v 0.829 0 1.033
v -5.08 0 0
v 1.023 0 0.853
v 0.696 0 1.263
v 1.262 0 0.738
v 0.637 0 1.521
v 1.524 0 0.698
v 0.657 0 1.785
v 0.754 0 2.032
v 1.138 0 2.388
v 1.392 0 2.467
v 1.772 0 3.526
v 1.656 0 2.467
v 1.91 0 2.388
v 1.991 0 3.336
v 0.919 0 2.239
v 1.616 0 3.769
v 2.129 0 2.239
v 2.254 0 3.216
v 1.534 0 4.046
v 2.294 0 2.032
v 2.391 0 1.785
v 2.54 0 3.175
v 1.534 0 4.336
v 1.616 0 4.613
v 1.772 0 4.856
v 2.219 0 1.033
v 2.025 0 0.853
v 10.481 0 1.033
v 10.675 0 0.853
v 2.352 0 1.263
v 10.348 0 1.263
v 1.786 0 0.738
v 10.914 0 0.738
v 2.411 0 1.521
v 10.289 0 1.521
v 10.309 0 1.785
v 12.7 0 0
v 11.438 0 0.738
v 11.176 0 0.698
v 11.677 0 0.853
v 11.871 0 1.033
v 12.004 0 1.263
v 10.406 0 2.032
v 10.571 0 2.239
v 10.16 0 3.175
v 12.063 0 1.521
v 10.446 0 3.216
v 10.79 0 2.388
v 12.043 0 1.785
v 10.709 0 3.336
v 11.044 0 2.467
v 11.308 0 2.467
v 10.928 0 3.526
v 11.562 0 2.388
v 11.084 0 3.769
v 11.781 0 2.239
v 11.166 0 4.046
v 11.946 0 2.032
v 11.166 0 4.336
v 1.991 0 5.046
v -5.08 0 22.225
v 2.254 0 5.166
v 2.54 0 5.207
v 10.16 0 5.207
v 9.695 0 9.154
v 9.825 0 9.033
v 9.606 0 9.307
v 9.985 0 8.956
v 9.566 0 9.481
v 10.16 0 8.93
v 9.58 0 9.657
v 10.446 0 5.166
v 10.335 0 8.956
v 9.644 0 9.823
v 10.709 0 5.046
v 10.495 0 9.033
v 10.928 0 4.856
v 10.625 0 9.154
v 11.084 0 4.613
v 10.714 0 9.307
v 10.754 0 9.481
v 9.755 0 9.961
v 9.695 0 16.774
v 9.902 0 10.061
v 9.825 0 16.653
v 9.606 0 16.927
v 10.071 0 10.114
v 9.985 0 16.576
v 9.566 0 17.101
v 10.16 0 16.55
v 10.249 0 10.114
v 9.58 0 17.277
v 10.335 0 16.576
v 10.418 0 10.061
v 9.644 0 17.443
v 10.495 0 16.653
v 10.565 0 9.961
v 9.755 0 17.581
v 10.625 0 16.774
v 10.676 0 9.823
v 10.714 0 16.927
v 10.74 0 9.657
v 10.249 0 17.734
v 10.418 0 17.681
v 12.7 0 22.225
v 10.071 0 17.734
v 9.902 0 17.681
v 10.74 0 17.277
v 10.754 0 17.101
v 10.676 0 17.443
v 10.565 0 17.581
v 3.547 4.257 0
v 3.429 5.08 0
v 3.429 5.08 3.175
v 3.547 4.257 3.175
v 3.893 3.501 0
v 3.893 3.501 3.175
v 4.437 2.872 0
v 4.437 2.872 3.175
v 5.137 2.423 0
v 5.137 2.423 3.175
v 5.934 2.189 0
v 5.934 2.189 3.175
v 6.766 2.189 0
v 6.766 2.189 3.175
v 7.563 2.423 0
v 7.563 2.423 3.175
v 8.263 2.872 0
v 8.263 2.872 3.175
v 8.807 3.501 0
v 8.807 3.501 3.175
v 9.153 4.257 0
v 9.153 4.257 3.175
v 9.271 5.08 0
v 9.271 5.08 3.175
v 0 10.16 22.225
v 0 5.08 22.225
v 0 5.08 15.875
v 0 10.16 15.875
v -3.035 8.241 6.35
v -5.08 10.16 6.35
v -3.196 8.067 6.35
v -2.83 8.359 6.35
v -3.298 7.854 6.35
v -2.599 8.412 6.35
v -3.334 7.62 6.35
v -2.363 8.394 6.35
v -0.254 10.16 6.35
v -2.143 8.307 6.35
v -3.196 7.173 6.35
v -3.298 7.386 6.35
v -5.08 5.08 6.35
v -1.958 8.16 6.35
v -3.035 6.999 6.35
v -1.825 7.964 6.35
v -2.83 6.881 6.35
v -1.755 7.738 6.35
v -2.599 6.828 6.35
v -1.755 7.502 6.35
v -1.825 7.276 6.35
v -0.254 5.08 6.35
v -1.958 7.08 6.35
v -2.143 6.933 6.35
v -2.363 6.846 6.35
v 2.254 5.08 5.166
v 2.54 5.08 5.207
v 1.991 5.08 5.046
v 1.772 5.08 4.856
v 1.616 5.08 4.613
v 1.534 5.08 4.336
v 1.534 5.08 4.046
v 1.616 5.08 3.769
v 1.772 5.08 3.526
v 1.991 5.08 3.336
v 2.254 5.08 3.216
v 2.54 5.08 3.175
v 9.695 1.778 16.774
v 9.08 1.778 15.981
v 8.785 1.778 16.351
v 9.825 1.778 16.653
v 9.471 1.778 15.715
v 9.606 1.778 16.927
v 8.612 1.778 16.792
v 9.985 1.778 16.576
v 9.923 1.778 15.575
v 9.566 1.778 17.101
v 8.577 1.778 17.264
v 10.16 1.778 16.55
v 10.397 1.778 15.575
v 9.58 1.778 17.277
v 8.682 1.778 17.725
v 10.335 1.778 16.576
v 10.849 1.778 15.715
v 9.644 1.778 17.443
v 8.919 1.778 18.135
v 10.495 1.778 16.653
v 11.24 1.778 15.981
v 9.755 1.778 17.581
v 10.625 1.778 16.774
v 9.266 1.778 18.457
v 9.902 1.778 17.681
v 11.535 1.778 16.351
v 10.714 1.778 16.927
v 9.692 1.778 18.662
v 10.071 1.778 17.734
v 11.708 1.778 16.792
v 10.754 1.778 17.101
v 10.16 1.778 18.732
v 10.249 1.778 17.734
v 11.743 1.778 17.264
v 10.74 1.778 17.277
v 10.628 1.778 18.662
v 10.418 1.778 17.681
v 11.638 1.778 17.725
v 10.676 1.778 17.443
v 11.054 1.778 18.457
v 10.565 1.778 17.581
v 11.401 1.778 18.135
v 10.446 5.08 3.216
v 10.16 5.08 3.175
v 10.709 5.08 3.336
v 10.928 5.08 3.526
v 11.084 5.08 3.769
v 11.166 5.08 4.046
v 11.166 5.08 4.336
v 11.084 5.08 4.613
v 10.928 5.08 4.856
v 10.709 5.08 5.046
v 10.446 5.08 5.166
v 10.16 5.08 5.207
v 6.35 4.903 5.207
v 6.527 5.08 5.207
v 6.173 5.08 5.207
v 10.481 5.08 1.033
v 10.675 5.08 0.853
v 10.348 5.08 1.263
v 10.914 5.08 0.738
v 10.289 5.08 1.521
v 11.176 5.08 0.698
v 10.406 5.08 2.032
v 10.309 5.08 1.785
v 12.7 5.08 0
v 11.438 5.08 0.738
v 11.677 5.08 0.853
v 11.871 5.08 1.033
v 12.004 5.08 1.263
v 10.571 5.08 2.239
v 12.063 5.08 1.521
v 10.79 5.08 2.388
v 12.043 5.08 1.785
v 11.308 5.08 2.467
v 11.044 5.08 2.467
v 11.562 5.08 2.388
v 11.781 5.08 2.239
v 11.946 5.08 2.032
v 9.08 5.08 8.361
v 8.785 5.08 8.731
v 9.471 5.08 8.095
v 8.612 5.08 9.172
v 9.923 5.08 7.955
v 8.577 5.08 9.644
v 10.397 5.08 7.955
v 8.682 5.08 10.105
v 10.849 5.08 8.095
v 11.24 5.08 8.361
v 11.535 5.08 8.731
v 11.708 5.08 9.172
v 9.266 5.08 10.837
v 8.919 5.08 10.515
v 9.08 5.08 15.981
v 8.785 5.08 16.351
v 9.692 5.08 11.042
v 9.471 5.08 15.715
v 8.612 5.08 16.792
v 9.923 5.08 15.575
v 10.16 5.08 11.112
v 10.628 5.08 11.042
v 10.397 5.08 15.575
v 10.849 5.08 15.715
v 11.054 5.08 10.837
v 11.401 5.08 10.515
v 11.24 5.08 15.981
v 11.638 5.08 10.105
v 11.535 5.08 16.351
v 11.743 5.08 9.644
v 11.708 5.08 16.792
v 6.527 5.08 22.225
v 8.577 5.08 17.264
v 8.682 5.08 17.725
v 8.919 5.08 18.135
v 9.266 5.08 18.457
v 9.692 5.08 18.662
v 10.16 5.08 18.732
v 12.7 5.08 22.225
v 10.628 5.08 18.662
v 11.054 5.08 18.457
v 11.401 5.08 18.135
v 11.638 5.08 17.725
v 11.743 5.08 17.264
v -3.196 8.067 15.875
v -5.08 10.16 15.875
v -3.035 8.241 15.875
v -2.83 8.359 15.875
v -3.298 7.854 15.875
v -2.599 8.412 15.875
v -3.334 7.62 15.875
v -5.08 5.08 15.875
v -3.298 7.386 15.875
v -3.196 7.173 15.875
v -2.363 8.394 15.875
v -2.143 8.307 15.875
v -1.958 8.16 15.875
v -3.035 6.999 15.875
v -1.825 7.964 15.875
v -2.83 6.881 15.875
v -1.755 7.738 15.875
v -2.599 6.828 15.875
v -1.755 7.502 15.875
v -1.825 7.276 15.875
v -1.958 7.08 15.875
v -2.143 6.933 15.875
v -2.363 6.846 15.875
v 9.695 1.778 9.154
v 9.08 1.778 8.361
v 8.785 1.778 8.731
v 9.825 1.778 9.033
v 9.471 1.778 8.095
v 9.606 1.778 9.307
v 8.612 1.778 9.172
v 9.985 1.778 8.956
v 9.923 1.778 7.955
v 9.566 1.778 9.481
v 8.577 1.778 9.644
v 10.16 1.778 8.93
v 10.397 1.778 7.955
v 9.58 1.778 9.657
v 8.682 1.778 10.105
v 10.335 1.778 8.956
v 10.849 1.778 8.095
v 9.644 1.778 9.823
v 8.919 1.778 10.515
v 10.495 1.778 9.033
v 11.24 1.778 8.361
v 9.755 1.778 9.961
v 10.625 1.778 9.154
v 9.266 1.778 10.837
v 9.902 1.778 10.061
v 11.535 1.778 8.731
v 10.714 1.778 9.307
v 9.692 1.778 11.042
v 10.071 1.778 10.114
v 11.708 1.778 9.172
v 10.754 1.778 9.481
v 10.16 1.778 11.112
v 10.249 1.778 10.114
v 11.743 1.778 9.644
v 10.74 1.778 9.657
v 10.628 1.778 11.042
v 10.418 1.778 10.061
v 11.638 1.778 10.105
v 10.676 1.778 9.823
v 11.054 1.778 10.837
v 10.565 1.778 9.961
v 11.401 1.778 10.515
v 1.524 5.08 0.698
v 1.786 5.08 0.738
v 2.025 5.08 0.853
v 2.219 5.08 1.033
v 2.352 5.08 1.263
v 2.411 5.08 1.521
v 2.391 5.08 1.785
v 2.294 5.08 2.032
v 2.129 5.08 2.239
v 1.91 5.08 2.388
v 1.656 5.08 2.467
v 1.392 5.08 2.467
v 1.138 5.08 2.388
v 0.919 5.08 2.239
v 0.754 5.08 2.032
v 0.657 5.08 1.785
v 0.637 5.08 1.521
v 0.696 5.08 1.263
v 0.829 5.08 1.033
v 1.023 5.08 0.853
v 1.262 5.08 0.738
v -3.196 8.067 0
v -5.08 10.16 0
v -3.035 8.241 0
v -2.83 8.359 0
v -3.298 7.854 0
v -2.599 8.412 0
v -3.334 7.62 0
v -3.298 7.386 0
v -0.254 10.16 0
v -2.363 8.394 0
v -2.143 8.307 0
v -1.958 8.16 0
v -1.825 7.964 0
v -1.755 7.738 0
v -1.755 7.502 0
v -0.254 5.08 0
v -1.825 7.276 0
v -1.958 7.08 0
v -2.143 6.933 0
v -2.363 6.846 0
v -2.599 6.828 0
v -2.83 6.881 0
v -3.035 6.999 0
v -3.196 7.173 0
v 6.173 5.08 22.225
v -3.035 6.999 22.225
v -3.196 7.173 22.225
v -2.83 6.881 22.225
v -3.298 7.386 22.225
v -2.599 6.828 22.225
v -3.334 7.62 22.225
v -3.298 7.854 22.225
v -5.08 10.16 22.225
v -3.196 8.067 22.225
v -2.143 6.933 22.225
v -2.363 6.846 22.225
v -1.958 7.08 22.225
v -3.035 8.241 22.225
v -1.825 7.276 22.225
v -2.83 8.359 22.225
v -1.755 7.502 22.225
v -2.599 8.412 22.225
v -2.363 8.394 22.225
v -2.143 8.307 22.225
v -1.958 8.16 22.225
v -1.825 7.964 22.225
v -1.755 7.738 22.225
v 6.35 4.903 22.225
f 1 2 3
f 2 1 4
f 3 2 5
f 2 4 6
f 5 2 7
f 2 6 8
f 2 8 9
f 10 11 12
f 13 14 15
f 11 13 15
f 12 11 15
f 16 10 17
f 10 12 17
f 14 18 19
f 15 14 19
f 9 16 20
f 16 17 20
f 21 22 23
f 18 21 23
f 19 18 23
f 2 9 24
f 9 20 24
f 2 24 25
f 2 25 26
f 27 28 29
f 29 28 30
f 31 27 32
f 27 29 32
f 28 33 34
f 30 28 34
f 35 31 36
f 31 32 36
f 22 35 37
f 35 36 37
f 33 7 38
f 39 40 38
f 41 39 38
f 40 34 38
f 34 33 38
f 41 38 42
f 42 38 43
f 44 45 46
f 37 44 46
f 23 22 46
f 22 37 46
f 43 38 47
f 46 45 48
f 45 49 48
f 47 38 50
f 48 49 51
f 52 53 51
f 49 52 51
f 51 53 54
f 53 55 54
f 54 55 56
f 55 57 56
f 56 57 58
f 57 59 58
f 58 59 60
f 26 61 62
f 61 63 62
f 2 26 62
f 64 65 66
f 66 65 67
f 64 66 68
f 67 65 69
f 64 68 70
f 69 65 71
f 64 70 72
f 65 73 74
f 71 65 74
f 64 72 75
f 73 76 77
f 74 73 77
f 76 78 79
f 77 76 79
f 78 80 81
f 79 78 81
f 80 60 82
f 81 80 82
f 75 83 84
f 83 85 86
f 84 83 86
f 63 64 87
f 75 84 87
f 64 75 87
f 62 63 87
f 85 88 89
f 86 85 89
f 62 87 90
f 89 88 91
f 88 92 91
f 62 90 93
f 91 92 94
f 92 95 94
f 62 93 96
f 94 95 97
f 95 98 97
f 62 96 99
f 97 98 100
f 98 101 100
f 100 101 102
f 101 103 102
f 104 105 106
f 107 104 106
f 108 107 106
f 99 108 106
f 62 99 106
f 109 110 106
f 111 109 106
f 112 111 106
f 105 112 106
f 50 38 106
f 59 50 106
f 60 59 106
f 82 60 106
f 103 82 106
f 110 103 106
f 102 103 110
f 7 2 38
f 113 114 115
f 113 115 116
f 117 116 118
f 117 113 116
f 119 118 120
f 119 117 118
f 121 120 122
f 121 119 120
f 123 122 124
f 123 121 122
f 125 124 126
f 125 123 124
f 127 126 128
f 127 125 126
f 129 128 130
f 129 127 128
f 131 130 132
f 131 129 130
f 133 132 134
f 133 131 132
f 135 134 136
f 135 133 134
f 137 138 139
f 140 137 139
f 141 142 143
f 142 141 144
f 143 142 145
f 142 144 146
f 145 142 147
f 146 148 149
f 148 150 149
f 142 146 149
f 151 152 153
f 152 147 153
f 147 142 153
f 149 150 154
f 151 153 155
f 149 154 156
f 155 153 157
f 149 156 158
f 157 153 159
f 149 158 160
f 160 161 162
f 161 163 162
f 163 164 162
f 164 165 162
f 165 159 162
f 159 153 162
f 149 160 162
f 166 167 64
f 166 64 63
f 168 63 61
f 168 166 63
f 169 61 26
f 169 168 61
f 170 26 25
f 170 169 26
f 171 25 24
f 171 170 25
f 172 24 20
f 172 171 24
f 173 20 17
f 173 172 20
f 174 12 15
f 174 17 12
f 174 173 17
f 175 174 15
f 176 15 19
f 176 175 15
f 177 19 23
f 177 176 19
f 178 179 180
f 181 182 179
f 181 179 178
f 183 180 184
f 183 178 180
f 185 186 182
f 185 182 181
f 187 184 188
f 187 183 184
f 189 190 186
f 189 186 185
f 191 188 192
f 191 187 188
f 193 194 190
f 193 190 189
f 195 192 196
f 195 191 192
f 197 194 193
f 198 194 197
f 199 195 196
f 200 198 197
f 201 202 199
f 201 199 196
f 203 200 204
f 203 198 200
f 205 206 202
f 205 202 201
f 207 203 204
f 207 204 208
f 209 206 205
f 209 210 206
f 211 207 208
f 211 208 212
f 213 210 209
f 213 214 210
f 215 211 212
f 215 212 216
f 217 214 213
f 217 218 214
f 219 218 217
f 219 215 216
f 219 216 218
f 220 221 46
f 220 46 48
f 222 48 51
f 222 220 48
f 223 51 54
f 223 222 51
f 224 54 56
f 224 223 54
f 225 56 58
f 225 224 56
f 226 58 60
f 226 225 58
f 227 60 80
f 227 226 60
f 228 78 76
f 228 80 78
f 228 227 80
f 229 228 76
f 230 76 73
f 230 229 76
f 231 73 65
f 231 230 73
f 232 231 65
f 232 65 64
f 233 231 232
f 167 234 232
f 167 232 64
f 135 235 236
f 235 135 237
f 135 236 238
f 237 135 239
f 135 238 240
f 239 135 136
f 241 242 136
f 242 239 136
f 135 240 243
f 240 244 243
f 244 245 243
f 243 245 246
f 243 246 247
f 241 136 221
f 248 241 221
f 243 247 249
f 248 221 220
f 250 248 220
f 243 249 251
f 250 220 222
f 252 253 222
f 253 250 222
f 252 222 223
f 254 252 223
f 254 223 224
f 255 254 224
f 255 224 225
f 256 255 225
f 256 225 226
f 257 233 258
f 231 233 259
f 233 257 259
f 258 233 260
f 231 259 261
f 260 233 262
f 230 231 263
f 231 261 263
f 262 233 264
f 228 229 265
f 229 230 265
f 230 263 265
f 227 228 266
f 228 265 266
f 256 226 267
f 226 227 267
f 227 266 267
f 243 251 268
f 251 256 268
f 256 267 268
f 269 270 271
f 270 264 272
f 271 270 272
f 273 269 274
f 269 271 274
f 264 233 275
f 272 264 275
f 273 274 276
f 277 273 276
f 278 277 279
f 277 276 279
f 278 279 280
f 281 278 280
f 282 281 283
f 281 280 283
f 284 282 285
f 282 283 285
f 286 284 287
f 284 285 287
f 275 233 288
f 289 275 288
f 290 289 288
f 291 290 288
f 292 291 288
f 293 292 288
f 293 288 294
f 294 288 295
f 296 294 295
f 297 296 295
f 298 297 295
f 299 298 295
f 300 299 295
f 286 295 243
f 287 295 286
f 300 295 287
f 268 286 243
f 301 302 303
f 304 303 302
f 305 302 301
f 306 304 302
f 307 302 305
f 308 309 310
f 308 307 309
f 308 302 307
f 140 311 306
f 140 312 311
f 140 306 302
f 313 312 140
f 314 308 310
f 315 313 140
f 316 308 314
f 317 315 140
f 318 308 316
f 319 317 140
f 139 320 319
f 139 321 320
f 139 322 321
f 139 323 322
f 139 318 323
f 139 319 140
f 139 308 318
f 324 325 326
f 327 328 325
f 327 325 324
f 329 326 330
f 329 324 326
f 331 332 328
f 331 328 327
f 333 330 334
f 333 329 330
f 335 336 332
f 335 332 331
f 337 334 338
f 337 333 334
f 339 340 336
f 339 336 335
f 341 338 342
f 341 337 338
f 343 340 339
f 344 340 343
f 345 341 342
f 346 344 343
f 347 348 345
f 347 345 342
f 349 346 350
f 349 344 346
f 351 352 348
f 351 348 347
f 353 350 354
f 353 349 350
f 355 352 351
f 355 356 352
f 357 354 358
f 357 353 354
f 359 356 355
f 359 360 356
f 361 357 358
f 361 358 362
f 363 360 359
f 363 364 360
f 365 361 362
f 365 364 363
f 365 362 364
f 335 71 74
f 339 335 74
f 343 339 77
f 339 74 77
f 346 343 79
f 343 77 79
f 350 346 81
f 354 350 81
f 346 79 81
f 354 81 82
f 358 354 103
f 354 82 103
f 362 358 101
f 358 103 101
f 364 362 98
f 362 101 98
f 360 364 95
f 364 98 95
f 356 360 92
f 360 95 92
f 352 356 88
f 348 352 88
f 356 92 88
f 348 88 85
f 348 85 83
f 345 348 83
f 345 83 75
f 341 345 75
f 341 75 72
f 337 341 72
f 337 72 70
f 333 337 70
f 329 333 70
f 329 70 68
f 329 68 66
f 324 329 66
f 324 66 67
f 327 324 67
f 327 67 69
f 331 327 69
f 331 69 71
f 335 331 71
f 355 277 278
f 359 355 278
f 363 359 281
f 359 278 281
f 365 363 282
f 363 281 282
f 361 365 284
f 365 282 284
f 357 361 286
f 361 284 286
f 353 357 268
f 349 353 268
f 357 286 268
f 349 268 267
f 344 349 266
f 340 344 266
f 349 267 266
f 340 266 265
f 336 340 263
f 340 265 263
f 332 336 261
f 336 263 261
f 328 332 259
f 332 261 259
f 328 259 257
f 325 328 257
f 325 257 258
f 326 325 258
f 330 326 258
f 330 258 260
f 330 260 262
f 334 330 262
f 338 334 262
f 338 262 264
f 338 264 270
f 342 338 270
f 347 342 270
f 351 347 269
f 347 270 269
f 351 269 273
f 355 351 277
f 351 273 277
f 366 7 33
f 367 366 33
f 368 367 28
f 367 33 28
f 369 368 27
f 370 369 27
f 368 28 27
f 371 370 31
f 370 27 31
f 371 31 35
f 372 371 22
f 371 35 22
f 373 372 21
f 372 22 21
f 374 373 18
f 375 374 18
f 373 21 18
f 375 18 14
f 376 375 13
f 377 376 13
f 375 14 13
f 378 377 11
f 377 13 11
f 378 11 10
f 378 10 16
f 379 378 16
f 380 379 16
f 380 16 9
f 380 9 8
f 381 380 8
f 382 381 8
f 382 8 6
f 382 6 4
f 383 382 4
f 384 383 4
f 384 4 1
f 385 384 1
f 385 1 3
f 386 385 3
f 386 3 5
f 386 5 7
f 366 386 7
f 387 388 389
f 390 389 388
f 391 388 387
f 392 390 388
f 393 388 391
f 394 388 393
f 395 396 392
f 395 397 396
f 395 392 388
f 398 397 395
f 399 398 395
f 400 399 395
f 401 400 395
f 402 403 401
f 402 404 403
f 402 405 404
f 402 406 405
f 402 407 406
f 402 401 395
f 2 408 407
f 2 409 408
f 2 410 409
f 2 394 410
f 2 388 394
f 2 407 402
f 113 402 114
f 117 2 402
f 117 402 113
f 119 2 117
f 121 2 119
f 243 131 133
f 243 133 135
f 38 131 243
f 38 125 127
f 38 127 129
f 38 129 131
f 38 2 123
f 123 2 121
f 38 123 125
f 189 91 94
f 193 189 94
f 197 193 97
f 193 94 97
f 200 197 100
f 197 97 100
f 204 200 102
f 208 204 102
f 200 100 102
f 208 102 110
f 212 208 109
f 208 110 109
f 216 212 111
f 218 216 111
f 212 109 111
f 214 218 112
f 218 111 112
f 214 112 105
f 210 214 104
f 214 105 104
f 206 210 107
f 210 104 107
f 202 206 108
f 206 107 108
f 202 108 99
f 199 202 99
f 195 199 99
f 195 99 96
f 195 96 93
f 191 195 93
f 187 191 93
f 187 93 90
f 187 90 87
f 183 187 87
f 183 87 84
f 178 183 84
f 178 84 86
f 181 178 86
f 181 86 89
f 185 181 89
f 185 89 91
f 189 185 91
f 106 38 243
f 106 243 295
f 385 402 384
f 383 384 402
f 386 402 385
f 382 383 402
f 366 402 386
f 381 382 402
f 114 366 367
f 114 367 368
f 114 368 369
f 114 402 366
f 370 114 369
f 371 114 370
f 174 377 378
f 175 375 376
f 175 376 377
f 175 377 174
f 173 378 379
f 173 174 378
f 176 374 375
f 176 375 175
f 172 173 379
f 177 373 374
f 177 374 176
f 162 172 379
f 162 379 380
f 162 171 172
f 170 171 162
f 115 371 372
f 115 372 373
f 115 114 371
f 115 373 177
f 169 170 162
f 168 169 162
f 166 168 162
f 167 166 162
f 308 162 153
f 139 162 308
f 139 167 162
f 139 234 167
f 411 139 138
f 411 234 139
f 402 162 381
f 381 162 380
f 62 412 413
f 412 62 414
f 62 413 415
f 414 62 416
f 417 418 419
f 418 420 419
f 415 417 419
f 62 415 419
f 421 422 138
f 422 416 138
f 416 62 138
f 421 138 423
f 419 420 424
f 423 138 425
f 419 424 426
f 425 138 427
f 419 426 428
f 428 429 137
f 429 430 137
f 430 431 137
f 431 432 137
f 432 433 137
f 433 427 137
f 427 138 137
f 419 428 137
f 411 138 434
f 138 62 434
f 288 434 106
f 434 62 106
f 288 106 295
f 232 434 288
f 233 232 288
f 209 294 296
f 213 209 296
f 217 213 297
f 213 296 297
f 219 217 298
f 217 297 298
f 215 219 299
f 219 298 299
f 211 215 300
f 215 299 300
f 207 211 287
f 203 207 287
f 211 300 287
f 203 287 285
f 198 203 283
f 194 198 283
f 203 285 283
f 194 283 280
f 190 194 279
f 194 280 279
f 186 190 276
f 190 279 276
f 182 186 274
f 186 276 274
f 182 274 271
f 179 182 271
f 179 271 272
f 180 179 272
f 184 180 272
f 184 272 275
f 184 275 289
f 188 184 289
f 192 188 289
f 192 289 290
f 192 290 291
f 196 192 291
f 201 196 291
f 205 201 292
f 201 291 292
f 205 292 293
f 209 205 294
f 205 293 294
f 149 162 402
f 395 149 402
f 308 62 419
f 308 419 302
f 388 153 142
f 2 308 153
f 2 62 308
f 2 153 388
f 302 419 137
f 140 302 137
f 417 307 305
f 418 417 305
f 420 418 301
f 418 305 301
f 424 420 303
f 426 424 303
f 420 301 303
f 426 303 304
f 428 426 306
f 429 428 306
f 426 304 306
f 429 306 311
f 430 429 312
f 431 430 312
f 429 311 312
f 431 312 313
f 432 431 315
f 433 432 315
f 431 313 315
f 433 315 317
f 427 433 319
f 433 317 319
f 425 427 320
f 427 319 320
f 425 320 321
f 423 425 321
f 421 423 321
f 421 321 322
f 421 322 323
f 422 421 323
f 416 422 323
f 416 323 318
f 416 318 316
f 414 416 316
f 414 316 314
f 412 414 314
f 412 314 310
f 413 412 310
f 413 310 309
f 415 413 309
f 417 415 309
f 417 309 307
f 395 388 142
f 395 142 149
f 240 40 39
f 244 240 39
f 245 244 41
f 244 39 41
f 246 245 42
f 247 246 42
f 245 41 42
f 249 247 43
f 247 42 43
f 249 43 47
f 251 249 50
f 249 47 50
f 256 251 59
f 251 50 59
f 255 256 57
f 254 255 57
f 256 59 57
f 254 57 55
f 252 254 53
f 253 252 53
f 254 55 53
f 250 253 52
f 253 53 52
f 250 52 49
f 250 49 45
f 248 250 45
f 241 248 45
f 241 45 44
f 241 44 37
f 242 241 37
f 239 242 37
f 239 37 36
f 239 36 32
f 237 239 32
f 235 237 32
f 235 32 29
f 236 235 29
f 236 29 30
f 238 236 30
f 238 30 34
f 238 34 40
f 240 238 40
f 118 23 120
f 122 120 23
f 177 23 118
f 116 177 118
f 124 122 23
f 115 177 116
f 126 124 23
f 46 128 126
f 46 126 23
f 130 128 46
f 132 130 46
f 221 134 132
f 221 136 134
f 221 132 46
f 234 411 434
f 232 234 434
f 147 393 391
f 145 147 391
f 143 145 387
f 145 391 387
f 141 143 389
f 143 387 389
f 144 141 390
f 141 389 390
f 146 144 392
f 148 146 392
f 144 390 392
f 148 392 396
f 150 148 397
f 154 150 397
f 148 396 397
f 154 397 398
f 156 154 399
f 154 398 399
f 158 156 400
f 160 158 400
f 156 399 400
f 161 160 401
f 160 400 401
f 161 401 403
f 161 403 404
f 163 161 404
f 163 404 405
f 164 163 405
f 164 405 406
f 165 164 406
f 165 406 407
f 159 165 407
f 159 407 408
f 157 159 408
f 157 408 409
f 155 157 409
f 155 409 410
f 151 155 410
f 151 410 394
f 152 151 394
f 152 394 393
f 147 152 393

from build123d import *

# Parameters (mm, degrees)
BOSS_EXTRUDE1_DEPTH                       = 3.175
SKETCH3_W                                 = 12.7
SKETCH3_H                                 = 19.05
BOSS_EXTRUDE2_DEPTH                       = 5.08
CUT_EXTRUDE2_DEPTH                        = 27.096877687
CUT_EXTRUDE3_DEPTH                        = 27.096877687
F_2_56_TAPPED_HOLE1_D                     = 1.778
SKETCH9_W                                 = 22.225
SKETCH9_H                                 = 5.08
BOSS_EXTRUDE3_DEPTH                       = 5.08
SKETCH12_R                                = 1.5875
CUT_EXTRUDE4_DEPTH                        = 3.302
SKETCH13_W                                = 4.826
SKETCH13_H                                = 6.35
SKETCH13_W_2                              = 5.08
BOSS_EXTRUDE4_DEPTH                       = 5.08
F_1_16_0_0625_DIAMETER_HOLE1_D            = 1.5875
F_3_64_0_04688_DIAMETER_HOLE1_D           = 1.190752
F_3_64_0_04688_DIAMETER_HOLE1_ON_FACE_2_D = 1.190752


with BuildPart() as part:
    # Sketch1 → Boss-Extrude1 (new body)
    with BuildSketch(Plane.XY):
        with BuildLine():
            Line((9.271, 5.08), (12.7, 5.08))
            Line((12.7, 5.08), (12.7, 0))
            Line((12.7, 0), (0, 0))
            Line((0, 0), (0, 5.08))
            Line((0, 5.08), (3.429, 5.08))
            ThreePointArc((3.429, 5.08), (6.35, 2.159), (9.271, 5.08))
        make_face()
    extrude(amount=BOSS_EXTRUDE1_DEPTH)

    # Sketch3 → Boss-Extrude2 (add)
    with BuildSketch(Plane.XZ):
        with Locations((6.35, 12.7)):
            Rectangle(SKETCH3_W, SKETCH3_H)
    extrude(amount=-BOSS_EXTRUDE2_DEPTH)

    # Sketch7 → Cut-Extrude2 (cut, through all)
    with BuildSketch(Plane(origin=(0, 5.08, 0), x_dir=(1, 0, 0), z_dir=(0, 1, 0))):
        with BuildLine():
            Line((2.54, -3.175), (10.16, -3.175))
            ThreePointArc((10.16, -3.175), (11.176, -4.191), (10.16, -5.207))
            Line((10.16, -5.207), (2.54, -5.207))
            ThreePointArc((2.54, -5.207), (1.524, -4.191), (2.54, -3.175))
        make_face()
    extrude(amount=-CUT_EXTRUDE2_DEPTH, mode=Mode.SUBTRACT)

    # Sketch6 → Cut-Extrude3 (cut, through all)
    with BuildSketch(Plane.XY.offset(22.225)):
        Polygon((6.173223305, 5.08), (6.35, 4.903223305), (6.526776695, 5.08), align=None)
    extrude(amount=-CUT_EXTRUDE3_DEPTH, mode=Mode.SUBTRACT)

    # #2-56 Tapped Hole1 (through all)
    with Locations(Plane(origin=(11.176, 5.08, 1.5875), x_dir=(0, 0, 1), z_dir=(0, 1, 0))):
        with Locations((0, 0), (0, -9.652)):
            Hole(F_2_56_TAPPED_HOLE1_D / 2)

    # Sketch9 → Boss-Extrude3 (add)
    with BuildSketch(Plane.ZY):
        with Locations((11.1125, 2.54)):
            Rectangle(SKETCH9_W, SKETCH9_H)
    extrude(amount=BOSS_EXTRUDE3_DEPTH)

    # Sketch12 → Cut-Extrude4 (cut)
    with BuildSketch(Plane(origin=(0, 5.08, 0), x_dir=(1, 0, 0), z_dir=(0, 1, 0))):
        with Locations(Location((10.16, -17.145, 0), (0, 0, 270))):
            Circle(SKETCH12_R)
        with Locations(Location((10.16, -9.525, 0), (0, 0, 270))):
            Circle(SKETCH12_R)
    extrude(amount=-CUT_EXTRUDE4_DEPTH, mode=Mode.SUBTRACT)

    # Sketch13 → Boss-Extrude4 (add)
    with BuildSketch(Plane(origin=(0, 5.08, 0), x_dir=(1, 0, 0), z_dir=(0, 1, 0))):
        with Locations((-2.667, -3.175)):
            Rectangle(SKETCH13_W, SKETCH13_H)
        with Locations((-2.54, -19.05)):
            Rectangle(SKETCH13_W_2, SKETCH13_H)
    extrude(amount=BOSS_EXTRUDE4_DEPTH)

    # 1/16 (0.0625) Diameter Hole1 (through all)
    with Locations(Plane.XY.offset(22.225)):
        with Locations((-2.54, 7.62)):
            Hole(F_1_16_0_0625_DIAMETER_HOLE1_D / 2)

    # 3/64 (0.04688) Diameter Hole1 (through all)
    with Locations(Plane(origin=(10.16, 5.08, 17.145), x_dir=(0, 0, 1), z_dir=(0, 1, 0))):
        with Locations((0, 0)):
            Hole(F_3_64_0_04688_DIAMETER_HOLE1_D / 2)

    # 3/64 (0.04688) Diameter Hole1 on face 2 (through all)
    with Locations(Plane(origin=(10.16, 1.778, 9.525), x_dir=(0, 0, 1), z_dir=(0, 1, 0))):
        with Locations((0, 0)):
            Hole(F_3_64_0_04688_DIAMETER_HOLE1_ON_FACE_2_D / 2)


solid = part.part
